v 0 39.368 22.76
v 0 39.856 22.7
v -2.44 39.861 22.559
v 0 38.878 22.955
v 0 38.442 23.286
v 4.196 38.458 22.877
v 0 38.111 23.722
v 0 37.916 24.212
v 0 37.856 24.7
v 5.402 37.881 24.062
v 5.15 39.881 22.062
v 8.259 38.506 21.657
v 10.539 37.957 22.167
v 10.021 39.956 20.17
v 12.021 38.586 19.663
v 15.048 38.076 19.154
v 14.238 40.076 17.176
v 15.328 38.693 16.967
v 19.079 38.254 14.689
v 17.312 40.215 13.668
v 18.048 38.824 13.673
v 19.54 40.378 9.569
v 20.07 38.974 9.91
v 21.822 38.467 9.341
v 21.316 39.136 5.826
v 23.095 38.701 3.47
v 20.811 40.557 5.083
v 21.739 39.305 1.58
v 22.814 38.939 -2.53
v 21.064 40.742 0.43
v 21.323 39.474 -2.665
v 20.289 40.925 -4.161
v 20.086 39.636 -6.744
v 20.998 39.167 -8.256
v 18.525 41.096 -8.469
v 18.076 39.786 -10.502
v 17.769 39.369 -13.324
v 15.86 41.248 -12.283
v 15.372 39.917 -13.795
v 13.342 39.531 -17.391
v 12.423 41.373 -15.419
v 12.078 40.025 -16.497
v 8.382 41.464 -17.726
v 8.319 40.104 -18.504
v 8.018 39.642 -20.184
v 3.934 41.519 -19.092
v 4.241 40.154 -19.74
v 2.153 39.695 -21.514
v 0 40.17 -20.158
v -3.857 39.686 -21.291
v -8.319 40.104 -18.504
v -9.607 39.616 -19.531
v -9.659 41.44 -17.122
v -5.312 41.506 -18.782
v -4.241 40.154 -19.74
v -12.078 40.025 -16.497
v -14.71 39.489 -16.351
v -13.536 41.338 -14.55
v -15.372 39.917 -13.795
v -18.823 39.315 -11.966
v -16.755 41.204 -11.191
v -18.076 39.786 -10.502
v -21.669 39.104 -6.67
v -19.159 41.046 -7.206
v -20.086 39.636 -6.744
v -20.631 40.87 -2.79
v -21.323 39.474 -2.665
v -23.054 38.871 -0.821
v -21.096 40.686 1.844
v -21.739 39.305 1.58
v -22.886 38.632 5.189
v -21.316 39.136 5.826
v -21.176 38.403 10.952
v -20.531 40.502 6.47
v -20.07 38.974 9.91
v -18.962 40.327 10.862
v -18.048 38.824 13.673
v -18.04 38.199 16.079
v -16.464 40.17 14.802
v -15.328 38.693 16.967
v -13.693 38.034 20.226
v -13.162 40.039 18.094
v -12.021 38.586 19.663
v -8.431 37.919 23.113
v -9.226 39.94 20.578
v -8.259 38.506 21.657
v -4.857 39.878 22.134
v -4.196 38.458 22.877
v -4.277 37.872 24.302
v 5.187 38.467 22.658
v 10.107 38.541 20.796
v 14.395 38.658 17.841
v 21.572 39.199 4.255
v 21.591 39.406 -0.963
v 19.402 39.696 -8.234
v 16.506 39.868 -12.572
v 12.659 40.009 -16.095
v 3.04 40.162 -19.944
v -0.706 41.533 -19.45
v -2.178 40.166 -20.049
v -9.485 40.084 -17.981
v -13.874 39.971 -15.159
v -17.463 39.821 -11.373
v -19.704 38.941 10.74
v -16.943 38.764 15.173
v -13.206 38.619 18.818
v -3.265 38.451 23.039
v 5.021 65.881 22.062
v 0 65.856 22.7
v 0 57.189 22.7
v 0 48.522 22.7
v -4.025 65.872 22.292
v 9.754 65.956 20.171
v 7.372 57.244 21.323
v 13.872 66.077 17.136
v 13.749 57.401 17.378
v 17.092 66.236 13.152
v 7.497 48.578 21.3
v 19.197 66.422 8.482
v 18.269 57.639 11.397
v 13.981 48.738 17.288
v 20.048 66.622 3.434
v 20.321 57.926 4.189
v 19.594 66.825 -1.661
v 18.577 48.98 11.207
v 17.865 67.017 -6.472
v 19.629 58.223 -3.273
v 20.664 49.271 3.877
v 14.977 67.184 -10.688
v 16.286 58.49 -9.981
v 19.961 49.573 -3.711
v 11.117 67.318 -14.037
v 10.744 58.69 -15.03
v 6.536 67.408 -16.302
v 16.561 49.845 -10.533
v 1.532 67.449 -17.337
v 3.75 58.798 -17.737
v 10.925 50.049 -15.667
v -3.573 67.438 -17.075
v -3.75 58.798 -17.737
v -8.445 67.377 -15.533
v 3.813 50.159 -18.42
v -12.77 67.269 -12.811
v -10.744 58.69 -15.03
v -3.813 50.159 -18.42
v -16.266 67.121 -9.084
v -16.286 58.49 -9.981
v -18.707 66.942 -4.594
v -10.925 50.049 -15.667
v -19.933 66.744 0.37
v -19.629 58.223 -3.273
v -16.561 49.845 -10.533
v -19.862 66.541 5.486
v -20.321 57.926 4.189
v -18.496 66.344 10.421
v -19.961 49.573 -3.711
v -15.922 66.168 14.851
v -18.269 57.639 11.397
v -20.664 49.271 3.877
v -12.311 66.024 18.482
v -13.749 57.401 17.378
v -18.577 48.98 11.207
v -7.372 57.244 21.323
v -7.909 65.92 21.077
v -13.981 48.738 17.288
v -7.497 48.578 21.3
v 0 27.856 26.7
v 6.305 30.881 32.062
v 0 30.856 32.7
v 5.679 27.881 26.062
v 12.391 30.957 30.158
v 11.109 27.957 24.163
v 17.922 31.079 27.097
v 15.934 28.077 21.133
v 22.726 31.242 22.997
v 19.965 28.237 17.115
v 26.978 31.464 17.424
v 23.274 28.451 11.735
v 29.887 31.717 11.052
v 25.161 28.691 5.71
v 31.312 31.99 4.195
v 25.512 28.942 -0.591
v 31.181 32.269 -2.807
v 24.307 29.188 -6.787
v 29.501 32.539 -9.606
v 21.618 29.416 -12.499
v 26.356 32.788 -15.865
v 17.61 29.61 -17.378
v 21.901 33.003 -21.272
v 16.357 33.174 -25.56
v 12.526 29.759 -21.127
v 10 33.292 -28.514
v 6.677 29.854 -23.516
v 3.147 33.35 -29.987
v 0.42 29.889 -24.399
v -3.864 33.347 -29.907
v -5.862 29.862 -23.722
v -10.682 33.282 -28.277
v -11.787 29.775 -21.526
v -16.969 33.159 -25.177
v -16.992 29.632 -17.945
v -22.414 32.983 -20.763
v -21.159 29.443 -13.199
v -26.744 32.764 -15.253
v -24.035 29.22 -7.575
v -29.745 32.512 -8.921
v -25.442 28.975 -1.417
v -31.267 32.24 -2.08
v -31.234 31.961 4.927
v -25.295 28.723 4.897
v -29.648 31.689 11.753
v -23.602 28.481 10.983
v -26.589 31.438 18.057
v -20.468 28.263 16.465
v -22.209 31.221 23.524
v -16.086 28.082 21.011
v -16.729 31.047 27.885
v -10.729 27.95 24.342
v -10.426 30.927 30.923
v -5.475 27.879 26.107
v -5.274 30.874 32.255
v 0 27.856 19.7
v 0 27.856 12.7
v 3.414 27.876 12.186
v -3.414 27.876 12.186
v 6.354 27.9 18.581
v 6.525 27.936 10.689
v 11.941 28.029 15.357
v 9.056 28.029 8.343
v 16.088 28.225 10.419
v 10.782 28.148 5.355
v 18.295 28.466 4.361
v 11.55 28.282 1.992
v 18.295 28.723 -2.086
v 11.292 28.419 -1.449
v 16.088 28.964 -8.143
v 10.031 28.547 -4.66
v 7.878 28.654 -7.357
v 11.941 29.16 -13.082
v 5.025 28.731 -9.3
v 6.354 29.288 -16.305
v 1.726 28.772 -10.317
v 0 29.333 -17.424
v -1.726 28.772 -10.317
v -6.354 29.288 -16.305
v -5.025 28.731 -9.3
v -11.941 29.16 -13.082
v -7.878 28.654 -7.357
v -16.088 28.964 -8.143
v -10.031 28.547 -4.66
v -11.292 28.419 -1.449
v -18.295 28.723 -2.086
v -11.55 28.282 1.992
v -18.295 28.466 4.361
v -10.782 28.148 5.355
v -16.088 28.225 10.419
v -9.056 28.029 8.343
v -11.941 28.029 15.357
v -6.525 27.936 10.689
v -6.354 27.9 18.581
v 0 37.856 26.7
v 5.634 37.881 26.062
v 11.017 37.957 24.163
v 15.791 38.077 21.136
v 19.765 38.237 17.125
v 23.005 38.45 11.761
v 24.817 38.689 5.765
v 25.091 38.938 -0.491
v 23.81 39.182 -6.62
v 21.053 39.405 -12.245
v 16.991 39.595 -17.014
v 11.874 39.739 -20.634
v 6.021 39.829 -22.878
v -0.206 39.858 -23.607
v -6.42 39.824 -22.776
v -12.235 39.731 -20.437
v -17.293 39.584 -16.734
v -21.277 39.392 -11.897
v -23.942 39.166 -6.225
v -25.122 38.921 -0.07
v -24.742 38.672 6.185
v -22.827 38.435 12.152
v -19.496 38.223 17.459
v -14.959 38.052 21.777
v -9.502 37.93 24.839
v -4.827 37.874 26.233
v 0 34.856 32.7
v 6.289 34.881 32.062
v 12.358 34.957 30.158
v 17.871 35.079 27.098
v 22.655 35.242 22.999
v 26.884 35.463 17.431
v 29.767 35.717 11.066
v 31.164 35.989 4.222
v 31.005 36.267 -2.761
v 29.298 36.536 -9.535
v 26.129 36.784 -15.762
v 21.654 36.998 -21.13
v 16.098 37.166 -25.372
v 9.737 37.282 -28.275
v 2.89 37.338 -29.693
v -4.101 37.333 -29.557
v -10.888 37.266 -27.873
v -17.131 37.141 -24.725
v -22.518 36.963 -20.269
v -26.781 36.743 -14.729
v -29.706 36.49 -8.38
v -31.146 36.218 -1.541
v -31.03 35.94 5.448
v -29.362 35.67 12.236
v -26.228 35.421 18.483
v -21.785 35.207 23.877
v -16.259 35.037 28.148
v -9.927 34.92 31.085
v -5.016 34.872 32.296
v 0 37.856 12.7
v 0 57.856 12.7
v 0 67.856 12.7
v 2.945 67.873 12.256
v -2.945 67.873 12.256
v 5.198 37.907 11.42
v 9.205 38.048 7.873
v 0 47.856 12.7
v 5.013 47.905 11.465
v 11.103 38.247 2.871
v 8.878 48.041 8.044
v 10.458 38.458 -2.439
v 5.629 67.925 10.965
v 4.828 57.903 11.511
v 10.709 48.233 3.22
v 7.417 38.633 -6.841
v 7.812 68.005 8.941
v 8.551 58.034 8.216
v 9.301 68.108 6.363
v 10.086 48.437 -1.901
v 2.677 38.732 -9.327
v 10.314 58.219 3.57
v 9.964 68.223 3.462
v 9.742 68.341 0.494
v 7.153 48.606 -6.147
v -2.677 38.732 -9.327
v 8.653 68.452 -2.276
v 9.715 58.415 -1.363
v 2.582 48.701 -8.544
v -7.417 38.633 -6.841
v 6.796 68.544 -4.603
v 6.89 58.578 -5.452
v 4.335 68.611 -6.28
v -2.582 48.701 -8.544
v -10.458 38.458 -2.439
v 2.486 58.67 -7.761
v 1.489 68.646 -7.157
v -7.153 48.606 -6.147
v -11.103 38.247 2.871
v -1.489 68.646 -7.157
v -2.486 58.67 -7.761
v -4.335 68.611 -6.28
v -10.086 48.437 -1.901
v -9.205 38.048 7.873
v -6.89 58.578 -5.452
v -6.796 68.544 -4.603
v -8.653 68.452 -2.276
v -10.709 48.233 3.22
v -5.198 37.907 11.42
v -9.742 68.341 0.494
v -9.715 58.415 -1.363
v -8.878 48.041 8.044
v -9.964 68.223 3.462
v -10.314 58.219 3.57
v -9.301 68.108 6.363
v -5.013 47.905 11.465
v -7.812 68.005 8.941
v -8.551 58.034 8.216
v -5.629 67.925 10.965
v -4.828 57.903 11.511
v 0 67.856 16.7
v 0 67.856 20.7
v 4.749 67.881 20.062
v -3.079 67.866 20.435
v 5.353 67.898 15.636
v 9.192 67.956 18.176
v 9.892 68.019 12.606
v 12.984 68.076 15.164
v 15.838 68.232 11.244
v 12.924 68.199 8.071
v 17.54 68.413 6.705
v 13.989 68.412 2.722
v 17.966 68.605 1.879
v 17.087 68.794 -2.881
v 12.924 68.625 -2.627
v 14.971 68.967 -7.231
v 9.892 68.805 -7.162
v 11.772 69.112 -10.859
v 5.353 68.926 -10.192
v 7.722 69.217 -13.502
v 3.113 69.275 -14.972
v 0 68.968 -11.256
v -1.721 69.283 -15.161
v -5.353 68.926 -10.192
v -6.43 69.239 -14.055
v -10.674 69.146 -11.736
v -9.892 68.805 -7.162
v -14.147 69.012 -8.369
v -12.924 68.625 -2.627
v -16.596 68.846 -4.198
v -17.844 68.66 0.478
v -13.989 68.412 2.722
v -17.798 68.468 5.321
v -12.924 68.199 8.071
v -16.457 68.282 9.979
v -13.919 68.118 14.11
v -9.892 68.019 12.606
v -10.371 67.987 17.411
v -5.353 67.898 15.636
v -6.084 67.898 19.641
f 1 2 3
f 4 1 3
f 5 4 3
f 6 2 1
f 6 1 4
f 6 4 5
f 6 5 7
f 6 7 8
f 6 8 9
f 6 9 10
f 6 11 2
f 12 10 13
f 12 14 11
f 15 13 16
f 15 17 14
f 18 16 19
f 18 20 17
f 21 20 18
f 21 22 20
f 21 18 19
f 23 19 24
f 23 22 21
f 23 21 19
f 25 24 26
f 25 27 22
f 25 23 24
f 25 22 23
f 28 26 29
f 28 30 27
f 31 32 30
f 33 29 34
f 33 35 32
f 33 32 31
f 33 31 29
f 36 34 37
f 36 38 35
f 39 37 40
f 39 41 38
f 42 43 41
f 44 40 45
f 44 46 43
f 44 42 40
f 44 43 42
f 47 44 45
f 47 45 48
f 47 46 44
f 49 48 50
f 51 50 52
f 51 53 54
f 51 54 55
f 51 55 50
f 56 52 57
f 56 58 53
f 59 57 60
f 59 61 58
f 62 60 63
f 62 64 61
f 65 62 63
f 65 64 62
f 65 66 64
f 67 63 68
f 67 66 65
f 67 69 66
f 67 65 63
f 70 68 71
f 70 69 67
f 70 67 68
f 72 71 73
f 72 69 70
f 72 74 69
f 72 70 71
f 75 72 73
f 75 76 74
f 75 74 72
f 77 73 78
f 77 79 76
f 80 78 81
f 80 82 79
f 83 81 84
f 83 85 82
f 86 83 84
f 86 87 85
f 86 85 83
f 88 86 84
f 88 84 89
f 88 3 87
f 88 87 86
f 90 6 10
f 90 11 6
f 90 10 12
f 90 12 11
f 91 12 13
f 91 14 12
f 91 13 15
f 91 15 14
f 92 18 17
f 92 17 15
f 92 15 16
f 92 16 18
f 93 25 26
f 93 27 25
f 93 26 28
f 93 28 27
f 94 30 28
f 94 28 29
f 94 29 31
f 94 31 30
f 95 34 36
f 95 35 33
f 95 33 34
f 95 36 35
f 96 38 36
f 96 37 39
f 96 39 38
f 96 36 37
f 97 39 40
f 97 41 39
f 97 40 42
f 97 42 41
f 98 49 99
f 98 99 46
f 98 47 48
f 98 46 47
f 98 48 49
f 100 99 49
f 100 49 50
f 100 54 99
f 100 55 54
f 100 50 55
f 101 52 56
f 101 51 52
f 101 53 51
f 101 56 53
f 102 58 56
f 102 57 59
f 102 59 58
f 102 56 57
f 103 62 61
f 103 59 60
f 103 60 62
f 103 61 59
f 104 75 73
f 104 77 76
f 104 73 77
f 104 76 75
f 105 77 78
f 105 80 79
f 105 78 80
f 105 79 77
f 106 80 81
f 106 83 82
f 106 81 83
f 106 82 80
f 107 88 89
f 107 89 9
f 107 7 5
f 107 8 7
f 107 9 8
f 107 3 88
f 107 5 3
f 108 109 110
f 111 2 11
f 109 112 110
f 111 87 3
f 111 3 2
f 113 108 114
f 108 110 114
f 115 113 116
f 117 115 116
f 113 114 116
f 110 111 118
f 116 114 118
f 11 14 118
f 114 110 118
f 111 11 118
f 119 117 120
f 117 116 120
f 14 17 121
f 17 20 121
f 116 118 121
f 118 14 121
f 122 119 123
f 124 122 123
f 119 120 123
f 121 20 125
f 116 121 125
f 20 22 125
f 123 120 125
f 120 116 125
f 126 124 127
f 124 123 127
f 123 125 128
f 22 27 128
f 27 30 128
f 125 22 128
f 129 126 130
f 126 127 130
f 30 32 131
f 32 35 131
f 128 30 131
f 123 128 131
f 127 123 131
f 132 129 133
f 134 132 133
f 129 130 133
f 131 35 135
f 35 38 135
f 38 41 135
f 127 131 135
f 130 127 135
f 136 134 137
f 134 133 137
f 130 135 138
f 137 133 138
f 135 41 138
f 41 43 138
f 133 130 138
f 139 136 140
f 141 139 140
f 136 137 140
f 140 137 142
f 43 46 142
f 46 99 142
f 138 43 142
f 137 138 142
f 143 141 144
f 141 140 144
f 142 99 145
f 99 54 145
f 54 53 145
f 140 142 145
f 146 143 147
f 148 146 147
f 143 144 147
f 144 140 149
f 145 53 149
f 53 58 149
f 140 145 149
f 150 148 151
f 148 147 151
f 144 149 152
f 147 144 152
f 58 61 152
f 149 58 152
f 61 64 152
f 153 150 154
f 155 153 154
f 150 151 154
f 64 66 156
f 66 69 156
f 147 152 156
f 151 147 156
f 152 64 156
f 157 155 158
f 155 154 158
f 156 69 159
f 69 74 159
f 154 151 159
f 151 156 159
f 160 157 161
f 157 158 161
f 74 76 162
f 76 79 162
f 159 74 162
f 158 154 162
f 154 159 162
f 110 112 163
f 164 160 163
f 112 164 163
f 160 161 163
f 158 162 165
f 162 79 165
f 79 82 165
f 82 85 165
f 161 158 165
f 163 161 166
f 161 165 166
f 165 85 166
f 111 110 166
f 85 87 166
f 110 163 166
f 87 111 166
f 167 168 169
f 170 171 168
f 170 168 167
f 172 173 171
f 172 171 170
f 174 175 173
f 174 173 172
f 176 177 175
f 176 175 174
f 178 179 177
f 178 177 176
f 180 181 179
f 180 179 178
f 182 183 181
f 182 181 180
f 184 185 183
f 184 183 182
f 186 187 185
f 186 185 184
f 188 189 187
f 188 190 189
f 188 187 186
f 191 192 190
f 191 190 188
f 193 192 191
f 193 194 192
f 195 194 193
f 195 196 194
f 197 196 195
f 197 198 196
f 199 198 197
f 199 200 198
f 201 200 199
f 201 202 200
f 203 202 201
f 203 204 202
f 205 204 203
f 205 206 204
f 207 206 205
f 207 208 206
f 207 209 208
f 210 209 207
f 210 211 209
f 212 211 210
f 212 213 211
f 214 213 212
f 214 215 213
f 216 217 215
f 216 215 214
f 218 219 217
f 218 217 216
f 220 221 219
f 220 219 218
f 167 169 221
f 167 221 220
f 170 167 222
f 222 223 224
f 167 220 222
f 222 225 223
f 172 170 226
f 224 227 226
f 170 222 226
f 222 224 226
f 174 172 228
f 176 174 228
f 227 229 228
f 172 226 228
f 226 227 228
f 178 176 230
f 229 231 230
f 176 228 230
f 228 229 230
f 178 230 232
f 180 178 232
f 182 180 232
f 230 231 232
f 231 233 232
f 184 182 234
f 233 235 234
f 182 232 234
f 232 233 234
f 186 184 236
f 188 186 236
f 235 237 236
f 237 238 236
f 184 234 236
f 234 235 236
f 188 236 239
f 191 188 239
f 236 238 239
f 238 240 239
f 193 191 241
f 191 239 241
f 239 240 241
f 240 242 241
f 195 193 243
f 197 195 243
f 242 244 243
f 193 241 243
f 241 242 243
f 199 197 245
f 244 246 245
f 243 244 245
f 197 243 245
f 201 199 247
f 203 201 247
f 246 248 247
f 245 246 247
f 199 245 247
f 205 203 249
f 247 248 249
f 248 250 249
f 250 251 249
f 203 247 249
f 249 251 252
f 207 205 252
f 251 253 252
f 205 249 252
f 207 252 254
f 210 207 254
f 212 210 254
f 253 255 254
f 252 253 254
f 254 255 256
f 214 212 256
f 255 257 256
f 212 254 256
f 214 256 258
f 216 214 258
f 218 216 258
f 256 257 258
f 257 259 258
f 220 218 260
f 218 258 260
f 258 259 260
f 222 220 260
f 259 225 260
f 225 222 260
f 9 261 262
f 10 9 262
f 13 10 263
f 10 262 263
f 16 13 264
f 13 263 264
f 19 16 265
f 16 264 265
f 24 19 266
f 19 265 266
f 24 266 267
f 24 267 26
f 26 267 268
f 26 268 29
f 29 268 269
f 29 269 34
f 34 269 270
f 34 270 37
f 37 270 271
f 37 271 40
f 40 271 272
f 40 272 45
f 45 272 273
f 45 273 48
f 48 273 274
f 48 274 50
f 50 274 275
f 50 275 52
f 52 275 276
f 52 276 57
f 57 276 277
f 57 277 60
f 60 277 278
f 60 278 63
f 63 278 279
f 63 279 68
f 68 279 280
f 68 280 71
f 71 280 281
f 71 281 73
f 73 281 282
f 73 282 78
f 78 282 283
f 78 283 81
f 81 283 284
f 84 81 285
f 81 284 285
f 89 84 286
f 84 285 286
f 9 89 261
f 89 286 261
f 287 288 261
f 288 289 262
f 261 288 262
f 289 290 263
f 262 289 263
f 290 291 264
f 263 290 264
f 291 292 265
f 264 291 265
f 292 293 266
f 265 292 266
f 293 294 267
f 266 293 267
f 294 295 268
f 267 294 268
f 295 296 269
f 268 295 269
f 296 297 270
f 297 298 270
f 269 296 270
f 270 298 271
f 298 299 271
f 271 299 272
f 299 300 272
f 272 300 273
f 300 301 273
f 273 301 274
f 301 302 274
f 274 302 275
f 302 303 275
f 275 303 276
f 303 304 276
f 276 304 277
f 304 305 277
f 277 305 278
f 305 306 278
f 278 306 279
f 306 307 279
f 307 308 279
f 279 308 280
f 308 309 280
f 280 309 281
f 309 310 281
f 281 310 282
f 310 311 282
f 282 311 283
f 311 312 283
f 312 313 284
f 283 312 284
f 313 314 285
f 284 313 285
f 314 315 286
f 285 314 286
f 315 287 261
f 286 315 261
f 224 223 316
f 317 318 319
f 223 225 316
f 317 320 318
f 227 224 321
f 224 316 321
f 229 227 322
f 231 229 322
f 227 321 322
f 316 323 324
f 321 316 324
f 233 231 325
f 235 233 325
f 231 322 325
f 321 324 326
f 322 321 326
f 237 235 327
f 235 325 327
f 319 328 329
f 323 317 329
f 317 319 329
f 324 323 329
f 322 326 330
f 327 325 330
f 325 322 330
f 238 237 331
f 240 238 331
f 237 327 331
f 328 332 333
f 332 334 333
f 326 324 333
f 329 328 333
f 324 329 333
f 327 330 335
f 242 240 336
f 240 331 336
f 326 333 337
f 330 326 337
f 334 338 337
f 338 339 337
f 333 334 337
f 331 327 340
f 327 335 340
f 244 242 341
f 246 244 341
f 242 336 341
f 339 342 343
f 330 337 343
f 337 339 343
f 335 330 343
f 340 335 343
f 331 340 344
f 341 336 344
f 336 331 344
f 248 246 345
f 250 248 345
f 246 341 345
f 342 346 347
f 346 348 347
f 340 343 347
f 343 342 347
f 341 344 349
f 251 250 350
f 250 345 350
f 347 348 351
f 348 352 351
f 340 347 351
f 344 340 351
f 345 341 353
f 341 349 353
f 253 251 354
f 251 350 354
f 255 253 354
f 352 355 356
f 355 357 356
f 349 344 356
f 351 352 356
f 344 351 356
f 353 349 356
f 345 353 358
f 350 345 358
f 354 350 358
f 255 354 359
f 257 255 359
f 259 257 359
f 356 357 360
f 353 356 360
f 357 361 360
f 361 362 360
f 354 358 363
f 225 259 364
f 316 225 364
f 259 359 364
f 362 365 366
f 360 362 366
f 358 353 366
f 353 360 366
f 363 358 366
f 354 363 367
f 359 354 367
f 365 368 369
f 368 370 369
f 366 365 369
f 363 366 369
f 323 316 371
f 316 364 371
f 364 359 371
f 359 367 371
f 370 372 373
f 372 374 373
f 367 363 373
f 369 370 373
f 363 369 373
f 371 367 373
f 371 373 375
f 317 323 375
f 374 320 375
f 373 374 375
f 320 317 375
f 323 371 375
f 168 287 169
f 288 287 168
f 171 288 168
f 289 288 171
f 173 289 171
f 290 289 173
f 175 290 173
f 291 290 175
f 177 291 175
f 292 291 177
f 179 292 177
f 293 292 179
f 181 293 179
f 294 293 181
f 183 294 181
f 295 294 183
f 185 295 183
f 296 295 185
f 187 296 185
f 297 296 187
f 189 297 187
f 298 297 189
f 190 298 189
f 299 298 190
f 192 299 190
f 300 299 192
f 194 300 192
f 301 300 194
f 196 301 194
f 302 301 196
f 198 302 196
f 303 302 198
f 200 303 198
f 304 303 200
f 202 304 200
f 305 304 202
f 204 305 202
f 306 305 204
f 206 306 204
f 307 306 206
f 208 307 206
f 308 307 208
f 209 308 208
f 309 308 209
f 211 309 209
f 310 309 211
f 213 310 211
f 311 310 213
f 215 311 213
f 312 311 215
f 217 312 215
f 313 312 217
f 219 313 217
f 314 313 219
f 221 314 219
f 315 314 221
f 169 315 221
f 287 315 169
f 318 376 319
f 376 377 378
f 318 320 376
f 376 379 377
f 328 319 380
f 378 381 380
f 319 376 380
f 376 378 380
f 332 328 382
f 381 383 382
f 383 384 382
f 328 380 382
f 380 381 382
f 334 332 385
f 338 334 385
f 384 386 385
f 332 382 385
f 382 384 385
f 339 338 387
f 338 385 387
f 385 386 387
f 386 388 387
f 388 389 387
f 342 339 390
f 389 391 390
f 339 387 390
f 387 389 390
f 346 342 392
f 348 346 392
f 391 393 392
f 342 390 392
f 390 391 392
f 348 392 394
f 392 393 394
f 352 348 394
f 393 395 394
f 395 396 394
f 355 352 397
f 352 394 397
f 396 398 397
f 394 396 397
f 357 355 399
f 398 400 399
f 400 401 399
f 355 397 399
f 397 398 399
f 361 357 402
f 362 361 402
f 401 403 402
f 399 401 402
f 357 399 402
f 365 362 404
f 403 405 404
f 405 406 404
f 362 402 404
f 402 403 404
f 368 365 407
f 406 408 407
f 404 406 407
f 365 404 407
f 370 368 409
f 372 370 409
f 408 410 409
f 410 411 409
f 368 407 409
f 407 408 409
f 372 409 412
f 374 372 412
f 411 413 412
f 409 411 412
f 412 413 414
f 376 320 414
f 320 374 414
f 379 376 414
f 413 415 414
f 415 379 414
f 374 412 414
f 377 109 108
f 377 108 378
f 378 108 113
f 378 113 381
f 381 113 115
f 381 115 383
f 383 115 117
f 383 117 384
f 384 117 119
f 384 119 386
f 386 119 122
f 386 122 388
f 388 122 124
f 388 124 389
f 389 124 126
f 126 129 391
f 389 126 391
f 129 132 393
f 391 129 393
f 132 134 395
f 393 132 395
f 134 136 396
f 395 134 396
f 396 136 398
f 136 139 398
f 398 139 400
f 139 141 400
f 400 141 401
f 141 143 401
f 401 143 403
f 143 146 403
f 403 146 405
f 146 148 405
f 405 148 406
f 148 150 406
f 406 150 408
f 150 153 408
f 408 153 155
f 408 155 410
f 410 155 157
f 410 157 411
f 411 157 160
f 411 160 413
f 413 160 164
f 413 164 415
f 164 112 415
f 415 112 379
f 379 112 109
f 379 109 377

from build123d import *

# Parameters (mm, degrees)
F0_W     = 30
F0_H     = 10
F0_W_2   = 10
F2_R     = 2
F3_SIZE  = 2
F4_SIZE2 = 6
F4_SIZE  = 3


with BuildPart() as f1:
    # F0 (on Right) → F1 (revolve)
    with BuildSketch(Plane.YZ):
        Polygon((37.8557965517, 22.7), (27.8557965517, 22.7), (27.8557965517, 12.7), (31.5659119412, 12.7), (37.8557965517, 12.7), align=None)
        with Locations((52.8557965517, 17.7)):
            Rectangle(F0_W, F0_H)
        with Locations((32.8557965517, 27.7)):
            Rectangle(F0_W_2, F0_H)
    revolve(axis=Axis((0, 33.9278982759, 1.35), (0, 0.9992093063, 0.0397588012)))

    # F2
    f2_edges = [f1.edges().sort_by_distance(p)[0] for p in [
        (0, 39.539737, -19.620411),
    ]]
    fillet(f2_edges, radius=F2_R)

    # F3
    f3_edges = [f1.edges().sort_by_distance(p)[0] for p in [
        (0, 69.444891, -17.23677),
    ]]
    chamfer(f3_edges, length=F3_SIZE)

    # F4
    f4_edges = [f1.edges().sort_by_distance(p)[0] for p in [
        (0, 40.334284, -29.588796),
        (0, 30.365899, -30.383343),
    ]]
    f4_side = f1.faces().sort_by_distance((0, 35.350092, -29.98607))[0]
    chamfer(f4_edges, length=F4_SIZE, length2=F4_SIZE2, reference=f4_side)


solid = f1.part
